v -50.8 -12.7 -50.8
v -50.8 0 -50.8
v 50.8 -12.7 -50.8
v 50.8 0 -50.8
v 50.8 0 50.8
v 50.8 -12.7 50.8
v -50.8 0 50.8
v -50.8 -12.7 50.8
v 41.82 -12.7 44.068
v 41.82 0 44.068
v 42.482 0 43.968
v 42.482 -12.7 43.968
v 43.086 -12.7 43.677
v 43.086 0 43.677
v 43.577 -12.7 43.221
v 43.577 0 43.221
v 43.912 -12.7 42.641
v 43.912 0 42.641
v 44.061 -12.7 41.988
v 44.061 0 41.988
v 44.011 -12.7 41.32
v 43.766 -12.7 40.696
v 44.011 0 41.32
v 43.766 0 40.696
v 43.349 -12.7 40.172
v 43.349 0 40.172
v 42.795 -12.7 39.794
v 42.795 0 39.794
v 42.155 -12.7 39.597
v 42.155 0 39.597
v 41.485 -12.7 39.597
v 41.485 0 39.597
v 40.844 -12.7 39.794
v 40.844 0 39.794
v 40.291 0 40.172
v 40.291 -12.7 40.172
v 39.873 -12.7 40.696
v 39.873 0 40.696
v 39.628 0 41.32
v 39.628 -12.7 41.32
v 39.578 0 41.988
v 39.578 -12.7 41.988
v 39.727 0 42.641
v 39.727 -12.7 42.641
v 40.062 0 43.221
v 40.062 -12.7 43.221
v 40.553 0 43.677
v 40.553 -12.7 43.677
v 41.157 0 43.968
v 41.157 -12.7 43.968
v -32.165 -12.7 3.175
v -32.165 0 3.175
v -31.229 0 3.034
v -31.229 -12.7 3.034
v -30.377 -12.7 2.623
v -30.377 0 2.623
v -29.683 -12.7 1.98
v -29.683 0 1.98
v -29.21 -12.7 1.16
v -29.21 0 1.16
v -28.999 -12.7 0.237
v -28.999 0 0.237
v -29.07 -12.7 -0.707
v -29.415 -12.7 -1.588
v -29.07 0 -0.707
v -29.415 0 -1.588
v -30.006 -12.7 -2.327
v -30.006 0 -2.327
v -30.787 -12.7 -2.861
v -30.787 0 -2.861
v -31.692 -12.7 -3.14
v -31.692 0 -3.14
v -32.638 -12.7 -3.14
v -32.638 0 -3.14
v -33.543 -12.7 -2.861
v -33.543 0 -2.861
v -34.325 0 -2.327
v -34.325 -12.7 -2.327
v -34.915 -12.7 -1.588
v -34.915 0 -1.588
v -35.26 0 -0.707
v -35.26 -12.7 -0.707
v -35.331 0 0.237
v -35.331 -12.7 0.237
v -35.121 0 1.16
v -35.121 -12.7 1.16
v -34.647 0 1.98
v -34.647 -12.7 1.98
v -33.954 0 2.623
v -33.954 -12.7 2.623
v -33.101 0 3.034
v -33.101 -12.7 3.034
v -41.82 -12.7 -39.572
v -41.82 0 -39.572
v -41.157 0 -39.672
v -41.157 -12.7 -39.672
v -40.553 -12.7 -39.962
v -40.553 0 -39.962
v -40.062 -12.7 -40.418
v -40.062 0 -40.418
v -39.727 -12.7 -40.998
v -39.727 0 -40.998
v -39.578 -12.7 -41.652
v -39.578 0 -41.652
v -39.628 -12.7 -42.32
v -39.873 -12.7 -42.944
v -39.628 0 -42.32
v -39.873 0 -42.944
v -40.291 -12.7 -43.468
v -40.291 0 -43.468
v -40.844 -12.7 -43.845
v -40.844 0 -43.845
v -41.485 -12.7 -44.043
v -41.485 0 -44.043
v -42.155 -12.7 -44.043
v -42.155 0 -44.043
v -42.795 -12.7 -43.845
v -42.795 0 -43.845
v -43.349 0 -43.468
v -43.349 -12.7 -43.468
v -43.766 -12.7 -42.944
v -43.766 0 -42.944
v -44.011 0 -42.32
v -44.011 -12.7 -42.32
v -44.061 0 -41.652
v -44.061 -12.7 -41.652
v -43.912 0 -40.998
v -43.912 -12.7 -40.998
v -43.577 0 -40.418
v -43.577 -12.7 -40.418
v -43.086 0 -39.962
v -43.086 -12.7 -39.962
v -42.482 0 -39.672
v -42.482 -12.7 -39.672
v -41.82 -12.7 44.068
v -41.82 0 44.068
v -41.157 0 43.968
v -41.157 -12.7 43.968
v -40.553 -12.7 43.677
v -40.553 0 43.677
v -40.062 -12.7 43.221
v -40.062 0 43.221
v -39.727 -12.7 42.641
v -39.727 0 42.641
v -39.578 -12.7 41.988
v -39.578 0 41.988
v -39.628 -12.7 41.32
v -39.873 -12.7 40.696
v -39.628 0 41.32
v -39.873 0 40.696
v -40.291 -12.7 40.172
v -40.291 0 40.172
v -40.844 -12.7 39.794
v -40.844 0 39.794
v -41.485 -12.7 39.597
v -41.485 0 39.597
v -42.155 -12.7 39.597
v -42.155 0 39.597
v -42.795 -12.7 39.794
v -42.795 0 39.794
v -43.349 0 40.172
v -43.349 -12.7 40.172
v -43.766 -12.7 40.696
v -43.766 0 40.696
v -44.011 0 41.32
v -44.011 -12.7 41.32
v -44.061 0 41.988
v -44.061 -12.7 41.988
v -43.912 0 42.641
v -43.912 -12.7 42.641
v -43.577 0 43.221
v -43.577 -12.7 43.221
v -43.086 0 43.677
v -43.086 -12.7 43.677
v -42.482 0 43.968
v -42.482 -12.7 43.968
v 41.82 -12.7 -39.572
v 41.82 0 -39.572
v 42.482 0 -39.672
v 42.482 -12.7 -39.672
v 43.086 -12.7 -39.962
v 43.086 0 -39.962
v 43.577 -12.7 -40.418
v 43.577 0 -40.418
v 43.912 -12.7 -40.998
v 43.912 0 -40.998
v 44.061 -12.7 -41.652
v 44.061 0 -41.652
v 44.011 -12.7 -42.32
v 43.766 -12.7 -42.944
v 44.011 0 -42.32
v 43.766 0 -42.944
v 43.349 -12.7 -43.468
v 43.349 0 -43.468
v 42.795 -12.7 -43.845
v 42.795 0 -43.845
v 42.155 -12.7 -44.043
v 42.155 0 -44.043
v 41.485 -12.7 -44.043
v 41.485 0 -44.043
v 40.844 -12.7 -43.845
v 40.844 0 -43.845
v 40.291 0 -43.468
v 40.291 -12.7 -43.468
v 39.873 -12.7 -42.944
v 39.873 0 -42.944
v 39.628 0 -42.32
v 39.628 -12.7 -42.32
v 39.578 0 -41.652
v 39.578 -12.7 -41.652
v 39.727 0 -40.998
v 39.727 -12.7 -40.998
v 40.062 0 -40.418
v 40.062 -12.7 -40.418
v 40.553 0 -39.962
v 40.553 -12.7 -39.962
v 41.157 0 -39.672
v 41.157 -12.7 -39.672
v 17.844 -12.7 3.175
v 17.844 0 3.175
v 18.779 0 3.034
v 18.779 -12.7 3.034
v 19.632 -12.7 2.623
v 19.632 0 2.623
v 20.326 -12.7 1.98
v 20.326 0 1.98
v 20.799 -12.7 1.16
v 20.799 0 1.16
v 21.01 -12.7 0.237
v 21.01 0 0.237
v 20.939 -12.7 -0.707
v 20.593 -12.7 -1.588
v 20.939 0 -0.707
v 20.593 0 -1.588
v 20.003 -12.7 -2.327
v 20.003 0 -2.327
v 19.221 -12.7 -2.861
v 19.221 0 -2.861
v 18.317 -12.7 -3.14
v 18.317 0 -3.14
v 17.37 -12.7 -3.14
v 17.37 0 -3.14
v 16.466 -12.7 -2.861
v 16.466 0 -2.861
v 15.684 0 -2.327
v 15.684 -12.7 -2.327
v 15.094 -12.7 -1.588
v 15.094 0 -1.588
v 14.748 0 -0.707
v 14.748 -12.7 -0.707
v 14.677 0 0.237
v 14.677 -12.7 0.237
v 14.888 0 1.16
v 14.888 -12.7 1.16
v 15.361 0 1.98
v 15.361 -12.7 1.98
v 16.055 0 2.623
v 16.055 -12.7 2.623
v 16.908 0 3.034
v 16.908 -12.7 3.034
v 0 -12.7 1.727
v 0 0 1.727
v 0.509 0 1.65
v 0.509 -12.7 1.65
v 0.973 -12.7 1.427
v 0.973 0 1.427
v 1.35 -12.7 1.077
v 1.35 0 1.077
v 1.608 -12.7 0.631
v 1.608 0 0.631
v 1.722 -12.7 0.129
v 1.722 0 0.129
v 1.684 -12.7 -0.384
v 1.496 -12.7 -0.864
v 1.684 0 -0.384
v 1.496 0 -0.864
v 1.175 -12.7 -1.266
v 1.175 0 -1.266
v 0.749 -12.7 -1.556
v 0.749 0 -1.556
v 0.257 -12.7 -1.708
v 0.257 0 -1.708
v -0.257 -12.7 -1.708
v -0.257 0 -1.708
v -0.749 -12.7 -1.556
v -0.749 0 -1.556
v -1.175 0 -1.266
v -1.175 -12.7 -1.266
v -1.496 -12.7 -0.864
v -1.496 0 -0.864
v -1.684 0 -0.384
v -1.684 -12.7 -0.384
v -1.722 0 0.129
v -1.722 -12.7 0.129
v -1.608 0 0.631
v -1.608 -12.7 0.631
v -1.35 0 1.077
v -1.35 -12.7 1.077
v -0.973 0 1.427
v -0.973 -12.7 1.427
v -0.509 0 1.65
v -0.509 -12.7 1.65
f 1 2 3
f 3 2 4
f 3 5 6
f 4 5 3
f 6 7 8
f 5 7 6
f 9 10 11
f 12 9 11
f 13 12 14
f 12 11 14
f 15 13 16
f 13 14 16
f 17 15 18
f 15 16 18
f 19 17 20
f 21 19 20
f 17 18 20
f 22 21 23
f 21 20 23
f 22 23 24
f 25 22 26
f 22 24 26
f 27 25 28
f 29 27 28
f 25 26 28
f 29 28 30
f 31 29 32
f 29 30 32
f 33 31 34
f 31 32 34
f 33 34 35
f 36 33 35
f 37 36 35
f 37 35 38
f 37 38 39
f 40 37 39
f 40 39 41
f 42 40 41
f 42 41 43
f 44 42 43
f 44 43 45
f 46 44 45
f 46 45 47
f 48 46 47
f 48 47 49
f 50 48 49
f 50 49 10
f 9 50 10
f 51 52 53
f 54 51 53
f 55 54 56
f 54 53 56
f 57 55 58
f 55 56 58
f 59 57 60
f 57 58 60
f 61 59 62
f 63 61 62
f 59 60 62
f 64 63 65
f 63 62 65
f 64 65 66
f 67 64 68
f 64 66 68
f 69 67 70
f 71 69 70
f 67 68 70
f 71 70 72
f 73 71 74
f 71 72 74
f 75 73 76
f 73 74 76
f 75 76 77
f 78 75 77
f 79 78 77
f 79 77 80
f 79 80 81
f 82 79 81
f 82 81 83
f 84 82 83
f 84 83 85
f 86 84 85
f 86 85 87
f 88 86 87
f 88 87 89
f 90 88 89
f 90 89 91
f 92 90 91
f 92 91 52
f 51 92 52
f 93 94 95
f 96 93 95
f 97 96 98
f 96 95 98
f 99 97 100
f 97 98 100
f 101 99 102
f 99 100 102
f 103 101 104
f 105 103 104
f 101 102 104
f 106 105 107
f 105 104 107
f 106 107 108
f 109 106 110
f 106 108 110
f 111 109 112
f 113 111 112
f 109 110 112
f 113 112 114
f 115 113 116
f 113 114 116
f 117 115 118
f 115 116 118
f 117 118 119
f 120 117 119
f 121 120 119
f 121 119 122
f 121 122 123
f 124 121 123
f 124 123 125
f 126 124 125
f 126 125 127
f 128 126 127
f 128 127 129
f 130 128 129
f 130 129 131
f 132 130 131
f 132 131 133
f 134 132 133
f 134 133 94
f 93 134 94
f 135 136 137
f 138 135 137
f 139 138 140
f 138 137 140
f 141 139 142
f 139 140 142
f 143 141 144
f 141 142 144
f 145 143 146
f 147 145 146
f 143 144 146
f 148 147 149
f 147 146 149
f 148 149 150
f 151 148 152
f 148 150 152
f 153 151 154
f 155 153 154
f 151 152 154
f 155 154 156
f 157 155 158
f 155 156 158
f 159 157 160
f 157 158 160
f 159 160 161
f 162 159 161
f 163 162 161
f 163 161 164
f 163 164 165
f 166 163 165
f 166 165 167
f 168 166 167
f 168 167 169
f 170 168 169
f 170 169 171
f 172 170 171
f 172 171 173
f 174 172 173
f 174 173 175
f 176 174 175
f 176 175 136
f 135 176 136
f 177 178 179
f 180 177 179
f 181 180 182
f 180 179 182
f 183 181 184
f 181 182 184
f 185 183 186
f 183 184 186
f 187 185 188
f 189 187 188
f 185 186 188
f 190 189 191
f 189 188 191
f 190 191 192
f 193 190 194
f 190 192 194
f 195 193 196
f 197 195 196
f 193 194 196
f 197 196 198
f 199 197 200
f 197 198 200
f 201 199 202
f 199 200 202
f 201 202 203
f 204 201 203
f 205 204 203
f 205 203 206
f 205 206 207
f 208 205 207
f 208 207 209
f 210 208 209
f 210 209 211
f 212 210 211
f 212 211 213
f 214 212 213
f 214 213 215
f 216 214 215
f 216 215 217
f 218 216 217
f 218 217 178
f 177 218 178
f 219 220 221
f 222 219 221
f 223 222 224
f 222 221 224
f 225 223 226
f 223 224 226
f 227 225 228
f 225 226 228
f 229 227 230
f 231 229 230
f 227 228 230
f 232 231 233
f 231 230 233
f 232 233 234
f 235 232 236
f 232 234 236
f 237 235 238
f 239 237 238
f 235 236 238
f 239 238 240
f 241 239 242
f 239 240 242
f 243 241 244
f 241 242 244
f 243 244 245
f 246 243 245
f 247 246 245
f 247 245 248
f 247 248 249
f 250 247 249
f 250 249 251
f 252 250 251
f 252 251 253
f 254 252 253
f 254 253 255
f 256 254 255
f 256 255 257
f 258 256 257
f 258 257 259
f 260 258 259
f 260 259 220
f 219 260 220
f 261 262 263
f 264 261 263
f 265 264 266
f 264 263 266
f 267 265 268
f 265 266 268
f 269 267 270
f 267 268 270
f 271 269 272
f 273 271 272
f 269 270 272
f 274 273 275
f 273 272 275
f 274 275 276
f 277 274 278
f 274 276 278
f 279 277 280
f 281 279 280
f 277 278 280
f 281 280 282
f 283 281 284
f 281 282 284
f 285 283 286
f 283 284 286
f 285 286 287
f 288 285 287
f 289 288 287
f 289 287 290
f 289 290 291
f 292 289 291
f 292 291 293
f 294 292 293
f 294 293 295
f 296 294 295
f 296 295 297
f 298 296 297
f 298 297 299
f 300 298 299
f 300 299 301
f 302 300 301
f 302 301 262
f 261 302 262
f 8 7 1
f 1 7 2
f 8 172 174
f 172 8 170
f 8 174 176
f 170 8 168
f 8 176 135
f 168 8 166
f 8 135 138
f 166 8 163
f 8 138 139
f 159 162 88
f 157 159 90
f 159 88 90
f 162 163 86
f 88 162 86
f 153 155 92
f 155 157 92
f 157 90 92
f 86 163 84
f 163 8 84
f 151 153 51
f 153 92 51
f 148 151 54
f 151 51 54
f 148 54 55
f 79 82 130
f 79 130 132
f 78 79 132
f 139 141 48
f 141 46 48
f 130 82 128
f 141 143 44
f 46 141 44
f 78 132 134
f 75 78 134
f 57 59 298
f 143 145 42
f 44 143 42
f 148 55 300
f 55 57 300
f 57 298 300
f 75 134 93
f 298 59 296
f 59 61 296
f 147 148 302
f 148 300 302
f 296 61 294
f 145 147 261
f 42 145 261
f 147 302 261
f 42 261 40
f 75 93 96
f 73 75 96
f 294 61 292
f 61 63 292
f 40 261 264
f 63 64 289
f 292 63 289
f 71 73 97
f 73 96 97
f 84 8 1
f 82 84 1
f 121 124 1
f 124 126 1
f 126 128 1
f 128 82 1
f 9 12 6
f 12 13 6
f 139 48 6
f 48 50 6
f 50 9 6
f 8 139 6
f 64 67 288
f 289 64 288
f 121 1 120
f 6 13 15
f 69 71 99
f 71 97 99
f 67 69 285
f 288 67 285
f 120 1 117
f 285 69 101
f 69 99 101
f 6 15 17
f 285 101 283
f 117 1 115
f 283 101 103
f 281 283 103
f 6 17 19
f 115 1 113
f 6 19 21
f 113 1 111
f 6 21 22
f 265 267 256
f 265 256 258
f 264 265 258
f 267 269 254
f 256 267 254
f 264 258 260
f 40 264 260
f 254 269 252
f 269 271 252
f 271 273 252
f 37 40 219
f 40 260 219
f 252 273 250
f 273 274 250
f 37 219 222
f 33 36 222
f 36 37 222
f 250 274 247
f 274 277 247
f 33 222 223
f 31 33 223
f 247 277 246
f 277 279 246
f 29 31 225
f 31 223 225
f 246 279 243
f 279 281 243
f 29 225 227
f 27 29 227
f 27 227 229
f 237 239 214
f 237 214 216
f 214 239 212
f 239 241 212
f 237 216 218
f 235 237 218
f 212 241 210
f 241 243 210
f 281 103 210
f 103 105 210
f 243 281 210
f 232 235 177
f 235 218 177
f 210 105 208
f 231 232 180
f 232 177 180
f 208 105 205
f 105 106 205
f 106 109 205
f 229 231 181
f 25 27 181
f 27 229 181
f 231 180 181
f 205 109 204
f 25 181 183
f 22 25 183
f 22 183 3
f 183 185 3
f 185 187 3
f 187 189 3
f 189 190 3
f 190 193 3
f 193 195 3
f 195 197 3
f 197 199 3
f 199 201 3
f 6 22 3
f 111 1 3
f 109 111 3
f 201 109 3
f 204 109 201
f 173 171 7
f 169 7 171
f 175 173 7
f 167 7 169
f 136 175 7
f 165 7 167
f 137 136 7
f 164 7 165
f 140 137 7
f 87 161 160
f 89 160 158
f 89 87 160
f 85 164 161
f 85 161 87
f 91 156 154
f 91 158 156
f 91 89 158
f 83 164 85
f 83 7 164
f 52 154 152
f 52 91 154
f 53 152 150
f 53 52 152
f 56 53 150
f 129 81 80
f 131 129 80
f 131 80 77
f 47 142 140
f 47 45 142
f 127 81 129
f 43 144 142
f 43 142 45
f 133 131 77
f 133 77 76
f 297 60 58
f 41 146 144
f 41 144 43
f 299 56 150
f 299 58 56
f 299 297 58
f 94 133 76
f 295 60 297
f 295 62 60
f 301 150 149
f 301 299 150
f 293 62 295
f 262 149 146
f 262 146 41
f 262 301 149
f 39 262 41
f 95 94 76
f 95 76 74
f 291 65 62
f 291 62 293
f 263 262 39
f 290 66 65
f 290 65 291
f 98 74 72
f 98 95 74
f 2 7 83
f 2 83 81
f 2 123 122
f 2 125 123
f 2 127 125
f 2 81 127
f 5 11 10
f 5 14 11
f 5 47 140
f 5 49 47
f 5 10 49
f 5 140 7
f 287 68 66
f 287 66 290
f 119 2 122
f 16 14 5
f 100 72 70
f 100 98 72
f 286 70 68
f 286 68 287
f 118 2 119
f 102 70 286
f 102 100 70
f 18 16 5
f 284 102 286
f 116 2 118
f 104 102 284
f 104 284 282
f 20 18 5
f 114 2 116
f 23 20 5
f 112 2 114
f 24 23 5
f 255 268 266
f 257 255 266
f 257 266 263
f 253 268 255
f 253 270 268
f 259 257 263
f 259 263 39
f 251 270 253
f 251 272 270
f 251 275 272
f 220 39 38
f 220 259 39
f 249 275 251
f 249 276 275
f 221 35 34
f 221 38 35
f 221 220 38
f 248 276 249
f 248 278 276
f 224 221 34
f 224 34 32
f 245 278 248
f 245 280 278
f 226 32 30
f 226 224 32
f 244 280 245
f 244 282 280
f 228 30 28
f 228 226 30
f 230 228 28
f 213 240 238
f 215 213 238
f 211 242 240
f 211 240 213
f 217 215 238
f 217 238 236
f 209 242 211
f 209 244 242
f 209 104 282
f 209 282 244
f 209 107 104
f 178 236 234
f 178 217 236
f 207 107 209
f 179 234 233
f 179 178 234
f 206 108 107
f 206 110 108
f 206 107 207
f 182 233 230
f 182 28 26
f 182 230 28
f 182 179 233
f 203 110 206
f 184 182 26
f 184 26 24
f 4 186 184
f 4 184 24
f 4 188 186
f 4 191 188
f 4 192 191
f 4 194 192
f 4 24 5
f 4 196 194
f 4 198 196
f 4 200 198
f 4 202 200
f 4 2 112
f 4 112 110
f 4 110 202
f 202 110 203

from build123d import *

# Parameters (mm, degrees)
SKETCH1_W           = 101.6
SKETCH1_H           = 101.6
BOSS_EXTRUDE1_DEPTH = 12.7
SKETCH3_R           = 3.175
SKETCH3_R_2         = 2.2479
SKETCH3_R_3         = 1.7272
CUT_EXTRUDE1_DEPTH  = 73.955945611


with BuildPart() as part:
    # Sketch1 → Boss-Extrude1 (new body)
    with BuildSketch(Plane(origin=(0, 0, 0), x_dir=(1, 0, 0), z_dir=(0, 1, 0))):
        Rectangle(SKETCH1_W, SKETCH1_H)
    extrude(amount=-BOSS_EXTRUDE1_DEPTH)

    # Sketch3 → Cut-Extrude1 (cut, through all)
    with BuildSketch(Plane(origin=(0, 0, 0), x_dir=(1, 0, 0), z_dir=(0, 1, 0))):
        with Locations(Location((17.8435508, 0, 0), (0, 0, 270))):
            Circle(SKETCH3_R)
        with Locations(Location((-32.16507791, 0, 0), (0, 0, 270))):
            Circle(SKETCH3_R)
        with Locations(Location((-41.819743879, 41.819743879, 0), (0, 0, 270))):
            Circle(SKETCH3_R_2)
        with Locations(Location((41.819743879, 41.819743879, 0), (0, 0, 270))):
            Circle(SKETCH3_R_2)
        with Locations(Location((41.819743879, -41.819743879, 0), (0, 0, 270))):
            Circle(SKETCH3_R_2)
        with Locations(Location((-41.819743879, -41.819743879, 0), (0, 0, 270))):
            Circle(SKETCH3_R_2)
        with Locations(Location((0, 0, 0), (0, 0, 270))):
            Circle(SKETCH3_R_3)
    extrude(amount=-CUT_EXTRUDE1_DEPTH, mode=Mode.SUBTRACT)


solid = part.part
